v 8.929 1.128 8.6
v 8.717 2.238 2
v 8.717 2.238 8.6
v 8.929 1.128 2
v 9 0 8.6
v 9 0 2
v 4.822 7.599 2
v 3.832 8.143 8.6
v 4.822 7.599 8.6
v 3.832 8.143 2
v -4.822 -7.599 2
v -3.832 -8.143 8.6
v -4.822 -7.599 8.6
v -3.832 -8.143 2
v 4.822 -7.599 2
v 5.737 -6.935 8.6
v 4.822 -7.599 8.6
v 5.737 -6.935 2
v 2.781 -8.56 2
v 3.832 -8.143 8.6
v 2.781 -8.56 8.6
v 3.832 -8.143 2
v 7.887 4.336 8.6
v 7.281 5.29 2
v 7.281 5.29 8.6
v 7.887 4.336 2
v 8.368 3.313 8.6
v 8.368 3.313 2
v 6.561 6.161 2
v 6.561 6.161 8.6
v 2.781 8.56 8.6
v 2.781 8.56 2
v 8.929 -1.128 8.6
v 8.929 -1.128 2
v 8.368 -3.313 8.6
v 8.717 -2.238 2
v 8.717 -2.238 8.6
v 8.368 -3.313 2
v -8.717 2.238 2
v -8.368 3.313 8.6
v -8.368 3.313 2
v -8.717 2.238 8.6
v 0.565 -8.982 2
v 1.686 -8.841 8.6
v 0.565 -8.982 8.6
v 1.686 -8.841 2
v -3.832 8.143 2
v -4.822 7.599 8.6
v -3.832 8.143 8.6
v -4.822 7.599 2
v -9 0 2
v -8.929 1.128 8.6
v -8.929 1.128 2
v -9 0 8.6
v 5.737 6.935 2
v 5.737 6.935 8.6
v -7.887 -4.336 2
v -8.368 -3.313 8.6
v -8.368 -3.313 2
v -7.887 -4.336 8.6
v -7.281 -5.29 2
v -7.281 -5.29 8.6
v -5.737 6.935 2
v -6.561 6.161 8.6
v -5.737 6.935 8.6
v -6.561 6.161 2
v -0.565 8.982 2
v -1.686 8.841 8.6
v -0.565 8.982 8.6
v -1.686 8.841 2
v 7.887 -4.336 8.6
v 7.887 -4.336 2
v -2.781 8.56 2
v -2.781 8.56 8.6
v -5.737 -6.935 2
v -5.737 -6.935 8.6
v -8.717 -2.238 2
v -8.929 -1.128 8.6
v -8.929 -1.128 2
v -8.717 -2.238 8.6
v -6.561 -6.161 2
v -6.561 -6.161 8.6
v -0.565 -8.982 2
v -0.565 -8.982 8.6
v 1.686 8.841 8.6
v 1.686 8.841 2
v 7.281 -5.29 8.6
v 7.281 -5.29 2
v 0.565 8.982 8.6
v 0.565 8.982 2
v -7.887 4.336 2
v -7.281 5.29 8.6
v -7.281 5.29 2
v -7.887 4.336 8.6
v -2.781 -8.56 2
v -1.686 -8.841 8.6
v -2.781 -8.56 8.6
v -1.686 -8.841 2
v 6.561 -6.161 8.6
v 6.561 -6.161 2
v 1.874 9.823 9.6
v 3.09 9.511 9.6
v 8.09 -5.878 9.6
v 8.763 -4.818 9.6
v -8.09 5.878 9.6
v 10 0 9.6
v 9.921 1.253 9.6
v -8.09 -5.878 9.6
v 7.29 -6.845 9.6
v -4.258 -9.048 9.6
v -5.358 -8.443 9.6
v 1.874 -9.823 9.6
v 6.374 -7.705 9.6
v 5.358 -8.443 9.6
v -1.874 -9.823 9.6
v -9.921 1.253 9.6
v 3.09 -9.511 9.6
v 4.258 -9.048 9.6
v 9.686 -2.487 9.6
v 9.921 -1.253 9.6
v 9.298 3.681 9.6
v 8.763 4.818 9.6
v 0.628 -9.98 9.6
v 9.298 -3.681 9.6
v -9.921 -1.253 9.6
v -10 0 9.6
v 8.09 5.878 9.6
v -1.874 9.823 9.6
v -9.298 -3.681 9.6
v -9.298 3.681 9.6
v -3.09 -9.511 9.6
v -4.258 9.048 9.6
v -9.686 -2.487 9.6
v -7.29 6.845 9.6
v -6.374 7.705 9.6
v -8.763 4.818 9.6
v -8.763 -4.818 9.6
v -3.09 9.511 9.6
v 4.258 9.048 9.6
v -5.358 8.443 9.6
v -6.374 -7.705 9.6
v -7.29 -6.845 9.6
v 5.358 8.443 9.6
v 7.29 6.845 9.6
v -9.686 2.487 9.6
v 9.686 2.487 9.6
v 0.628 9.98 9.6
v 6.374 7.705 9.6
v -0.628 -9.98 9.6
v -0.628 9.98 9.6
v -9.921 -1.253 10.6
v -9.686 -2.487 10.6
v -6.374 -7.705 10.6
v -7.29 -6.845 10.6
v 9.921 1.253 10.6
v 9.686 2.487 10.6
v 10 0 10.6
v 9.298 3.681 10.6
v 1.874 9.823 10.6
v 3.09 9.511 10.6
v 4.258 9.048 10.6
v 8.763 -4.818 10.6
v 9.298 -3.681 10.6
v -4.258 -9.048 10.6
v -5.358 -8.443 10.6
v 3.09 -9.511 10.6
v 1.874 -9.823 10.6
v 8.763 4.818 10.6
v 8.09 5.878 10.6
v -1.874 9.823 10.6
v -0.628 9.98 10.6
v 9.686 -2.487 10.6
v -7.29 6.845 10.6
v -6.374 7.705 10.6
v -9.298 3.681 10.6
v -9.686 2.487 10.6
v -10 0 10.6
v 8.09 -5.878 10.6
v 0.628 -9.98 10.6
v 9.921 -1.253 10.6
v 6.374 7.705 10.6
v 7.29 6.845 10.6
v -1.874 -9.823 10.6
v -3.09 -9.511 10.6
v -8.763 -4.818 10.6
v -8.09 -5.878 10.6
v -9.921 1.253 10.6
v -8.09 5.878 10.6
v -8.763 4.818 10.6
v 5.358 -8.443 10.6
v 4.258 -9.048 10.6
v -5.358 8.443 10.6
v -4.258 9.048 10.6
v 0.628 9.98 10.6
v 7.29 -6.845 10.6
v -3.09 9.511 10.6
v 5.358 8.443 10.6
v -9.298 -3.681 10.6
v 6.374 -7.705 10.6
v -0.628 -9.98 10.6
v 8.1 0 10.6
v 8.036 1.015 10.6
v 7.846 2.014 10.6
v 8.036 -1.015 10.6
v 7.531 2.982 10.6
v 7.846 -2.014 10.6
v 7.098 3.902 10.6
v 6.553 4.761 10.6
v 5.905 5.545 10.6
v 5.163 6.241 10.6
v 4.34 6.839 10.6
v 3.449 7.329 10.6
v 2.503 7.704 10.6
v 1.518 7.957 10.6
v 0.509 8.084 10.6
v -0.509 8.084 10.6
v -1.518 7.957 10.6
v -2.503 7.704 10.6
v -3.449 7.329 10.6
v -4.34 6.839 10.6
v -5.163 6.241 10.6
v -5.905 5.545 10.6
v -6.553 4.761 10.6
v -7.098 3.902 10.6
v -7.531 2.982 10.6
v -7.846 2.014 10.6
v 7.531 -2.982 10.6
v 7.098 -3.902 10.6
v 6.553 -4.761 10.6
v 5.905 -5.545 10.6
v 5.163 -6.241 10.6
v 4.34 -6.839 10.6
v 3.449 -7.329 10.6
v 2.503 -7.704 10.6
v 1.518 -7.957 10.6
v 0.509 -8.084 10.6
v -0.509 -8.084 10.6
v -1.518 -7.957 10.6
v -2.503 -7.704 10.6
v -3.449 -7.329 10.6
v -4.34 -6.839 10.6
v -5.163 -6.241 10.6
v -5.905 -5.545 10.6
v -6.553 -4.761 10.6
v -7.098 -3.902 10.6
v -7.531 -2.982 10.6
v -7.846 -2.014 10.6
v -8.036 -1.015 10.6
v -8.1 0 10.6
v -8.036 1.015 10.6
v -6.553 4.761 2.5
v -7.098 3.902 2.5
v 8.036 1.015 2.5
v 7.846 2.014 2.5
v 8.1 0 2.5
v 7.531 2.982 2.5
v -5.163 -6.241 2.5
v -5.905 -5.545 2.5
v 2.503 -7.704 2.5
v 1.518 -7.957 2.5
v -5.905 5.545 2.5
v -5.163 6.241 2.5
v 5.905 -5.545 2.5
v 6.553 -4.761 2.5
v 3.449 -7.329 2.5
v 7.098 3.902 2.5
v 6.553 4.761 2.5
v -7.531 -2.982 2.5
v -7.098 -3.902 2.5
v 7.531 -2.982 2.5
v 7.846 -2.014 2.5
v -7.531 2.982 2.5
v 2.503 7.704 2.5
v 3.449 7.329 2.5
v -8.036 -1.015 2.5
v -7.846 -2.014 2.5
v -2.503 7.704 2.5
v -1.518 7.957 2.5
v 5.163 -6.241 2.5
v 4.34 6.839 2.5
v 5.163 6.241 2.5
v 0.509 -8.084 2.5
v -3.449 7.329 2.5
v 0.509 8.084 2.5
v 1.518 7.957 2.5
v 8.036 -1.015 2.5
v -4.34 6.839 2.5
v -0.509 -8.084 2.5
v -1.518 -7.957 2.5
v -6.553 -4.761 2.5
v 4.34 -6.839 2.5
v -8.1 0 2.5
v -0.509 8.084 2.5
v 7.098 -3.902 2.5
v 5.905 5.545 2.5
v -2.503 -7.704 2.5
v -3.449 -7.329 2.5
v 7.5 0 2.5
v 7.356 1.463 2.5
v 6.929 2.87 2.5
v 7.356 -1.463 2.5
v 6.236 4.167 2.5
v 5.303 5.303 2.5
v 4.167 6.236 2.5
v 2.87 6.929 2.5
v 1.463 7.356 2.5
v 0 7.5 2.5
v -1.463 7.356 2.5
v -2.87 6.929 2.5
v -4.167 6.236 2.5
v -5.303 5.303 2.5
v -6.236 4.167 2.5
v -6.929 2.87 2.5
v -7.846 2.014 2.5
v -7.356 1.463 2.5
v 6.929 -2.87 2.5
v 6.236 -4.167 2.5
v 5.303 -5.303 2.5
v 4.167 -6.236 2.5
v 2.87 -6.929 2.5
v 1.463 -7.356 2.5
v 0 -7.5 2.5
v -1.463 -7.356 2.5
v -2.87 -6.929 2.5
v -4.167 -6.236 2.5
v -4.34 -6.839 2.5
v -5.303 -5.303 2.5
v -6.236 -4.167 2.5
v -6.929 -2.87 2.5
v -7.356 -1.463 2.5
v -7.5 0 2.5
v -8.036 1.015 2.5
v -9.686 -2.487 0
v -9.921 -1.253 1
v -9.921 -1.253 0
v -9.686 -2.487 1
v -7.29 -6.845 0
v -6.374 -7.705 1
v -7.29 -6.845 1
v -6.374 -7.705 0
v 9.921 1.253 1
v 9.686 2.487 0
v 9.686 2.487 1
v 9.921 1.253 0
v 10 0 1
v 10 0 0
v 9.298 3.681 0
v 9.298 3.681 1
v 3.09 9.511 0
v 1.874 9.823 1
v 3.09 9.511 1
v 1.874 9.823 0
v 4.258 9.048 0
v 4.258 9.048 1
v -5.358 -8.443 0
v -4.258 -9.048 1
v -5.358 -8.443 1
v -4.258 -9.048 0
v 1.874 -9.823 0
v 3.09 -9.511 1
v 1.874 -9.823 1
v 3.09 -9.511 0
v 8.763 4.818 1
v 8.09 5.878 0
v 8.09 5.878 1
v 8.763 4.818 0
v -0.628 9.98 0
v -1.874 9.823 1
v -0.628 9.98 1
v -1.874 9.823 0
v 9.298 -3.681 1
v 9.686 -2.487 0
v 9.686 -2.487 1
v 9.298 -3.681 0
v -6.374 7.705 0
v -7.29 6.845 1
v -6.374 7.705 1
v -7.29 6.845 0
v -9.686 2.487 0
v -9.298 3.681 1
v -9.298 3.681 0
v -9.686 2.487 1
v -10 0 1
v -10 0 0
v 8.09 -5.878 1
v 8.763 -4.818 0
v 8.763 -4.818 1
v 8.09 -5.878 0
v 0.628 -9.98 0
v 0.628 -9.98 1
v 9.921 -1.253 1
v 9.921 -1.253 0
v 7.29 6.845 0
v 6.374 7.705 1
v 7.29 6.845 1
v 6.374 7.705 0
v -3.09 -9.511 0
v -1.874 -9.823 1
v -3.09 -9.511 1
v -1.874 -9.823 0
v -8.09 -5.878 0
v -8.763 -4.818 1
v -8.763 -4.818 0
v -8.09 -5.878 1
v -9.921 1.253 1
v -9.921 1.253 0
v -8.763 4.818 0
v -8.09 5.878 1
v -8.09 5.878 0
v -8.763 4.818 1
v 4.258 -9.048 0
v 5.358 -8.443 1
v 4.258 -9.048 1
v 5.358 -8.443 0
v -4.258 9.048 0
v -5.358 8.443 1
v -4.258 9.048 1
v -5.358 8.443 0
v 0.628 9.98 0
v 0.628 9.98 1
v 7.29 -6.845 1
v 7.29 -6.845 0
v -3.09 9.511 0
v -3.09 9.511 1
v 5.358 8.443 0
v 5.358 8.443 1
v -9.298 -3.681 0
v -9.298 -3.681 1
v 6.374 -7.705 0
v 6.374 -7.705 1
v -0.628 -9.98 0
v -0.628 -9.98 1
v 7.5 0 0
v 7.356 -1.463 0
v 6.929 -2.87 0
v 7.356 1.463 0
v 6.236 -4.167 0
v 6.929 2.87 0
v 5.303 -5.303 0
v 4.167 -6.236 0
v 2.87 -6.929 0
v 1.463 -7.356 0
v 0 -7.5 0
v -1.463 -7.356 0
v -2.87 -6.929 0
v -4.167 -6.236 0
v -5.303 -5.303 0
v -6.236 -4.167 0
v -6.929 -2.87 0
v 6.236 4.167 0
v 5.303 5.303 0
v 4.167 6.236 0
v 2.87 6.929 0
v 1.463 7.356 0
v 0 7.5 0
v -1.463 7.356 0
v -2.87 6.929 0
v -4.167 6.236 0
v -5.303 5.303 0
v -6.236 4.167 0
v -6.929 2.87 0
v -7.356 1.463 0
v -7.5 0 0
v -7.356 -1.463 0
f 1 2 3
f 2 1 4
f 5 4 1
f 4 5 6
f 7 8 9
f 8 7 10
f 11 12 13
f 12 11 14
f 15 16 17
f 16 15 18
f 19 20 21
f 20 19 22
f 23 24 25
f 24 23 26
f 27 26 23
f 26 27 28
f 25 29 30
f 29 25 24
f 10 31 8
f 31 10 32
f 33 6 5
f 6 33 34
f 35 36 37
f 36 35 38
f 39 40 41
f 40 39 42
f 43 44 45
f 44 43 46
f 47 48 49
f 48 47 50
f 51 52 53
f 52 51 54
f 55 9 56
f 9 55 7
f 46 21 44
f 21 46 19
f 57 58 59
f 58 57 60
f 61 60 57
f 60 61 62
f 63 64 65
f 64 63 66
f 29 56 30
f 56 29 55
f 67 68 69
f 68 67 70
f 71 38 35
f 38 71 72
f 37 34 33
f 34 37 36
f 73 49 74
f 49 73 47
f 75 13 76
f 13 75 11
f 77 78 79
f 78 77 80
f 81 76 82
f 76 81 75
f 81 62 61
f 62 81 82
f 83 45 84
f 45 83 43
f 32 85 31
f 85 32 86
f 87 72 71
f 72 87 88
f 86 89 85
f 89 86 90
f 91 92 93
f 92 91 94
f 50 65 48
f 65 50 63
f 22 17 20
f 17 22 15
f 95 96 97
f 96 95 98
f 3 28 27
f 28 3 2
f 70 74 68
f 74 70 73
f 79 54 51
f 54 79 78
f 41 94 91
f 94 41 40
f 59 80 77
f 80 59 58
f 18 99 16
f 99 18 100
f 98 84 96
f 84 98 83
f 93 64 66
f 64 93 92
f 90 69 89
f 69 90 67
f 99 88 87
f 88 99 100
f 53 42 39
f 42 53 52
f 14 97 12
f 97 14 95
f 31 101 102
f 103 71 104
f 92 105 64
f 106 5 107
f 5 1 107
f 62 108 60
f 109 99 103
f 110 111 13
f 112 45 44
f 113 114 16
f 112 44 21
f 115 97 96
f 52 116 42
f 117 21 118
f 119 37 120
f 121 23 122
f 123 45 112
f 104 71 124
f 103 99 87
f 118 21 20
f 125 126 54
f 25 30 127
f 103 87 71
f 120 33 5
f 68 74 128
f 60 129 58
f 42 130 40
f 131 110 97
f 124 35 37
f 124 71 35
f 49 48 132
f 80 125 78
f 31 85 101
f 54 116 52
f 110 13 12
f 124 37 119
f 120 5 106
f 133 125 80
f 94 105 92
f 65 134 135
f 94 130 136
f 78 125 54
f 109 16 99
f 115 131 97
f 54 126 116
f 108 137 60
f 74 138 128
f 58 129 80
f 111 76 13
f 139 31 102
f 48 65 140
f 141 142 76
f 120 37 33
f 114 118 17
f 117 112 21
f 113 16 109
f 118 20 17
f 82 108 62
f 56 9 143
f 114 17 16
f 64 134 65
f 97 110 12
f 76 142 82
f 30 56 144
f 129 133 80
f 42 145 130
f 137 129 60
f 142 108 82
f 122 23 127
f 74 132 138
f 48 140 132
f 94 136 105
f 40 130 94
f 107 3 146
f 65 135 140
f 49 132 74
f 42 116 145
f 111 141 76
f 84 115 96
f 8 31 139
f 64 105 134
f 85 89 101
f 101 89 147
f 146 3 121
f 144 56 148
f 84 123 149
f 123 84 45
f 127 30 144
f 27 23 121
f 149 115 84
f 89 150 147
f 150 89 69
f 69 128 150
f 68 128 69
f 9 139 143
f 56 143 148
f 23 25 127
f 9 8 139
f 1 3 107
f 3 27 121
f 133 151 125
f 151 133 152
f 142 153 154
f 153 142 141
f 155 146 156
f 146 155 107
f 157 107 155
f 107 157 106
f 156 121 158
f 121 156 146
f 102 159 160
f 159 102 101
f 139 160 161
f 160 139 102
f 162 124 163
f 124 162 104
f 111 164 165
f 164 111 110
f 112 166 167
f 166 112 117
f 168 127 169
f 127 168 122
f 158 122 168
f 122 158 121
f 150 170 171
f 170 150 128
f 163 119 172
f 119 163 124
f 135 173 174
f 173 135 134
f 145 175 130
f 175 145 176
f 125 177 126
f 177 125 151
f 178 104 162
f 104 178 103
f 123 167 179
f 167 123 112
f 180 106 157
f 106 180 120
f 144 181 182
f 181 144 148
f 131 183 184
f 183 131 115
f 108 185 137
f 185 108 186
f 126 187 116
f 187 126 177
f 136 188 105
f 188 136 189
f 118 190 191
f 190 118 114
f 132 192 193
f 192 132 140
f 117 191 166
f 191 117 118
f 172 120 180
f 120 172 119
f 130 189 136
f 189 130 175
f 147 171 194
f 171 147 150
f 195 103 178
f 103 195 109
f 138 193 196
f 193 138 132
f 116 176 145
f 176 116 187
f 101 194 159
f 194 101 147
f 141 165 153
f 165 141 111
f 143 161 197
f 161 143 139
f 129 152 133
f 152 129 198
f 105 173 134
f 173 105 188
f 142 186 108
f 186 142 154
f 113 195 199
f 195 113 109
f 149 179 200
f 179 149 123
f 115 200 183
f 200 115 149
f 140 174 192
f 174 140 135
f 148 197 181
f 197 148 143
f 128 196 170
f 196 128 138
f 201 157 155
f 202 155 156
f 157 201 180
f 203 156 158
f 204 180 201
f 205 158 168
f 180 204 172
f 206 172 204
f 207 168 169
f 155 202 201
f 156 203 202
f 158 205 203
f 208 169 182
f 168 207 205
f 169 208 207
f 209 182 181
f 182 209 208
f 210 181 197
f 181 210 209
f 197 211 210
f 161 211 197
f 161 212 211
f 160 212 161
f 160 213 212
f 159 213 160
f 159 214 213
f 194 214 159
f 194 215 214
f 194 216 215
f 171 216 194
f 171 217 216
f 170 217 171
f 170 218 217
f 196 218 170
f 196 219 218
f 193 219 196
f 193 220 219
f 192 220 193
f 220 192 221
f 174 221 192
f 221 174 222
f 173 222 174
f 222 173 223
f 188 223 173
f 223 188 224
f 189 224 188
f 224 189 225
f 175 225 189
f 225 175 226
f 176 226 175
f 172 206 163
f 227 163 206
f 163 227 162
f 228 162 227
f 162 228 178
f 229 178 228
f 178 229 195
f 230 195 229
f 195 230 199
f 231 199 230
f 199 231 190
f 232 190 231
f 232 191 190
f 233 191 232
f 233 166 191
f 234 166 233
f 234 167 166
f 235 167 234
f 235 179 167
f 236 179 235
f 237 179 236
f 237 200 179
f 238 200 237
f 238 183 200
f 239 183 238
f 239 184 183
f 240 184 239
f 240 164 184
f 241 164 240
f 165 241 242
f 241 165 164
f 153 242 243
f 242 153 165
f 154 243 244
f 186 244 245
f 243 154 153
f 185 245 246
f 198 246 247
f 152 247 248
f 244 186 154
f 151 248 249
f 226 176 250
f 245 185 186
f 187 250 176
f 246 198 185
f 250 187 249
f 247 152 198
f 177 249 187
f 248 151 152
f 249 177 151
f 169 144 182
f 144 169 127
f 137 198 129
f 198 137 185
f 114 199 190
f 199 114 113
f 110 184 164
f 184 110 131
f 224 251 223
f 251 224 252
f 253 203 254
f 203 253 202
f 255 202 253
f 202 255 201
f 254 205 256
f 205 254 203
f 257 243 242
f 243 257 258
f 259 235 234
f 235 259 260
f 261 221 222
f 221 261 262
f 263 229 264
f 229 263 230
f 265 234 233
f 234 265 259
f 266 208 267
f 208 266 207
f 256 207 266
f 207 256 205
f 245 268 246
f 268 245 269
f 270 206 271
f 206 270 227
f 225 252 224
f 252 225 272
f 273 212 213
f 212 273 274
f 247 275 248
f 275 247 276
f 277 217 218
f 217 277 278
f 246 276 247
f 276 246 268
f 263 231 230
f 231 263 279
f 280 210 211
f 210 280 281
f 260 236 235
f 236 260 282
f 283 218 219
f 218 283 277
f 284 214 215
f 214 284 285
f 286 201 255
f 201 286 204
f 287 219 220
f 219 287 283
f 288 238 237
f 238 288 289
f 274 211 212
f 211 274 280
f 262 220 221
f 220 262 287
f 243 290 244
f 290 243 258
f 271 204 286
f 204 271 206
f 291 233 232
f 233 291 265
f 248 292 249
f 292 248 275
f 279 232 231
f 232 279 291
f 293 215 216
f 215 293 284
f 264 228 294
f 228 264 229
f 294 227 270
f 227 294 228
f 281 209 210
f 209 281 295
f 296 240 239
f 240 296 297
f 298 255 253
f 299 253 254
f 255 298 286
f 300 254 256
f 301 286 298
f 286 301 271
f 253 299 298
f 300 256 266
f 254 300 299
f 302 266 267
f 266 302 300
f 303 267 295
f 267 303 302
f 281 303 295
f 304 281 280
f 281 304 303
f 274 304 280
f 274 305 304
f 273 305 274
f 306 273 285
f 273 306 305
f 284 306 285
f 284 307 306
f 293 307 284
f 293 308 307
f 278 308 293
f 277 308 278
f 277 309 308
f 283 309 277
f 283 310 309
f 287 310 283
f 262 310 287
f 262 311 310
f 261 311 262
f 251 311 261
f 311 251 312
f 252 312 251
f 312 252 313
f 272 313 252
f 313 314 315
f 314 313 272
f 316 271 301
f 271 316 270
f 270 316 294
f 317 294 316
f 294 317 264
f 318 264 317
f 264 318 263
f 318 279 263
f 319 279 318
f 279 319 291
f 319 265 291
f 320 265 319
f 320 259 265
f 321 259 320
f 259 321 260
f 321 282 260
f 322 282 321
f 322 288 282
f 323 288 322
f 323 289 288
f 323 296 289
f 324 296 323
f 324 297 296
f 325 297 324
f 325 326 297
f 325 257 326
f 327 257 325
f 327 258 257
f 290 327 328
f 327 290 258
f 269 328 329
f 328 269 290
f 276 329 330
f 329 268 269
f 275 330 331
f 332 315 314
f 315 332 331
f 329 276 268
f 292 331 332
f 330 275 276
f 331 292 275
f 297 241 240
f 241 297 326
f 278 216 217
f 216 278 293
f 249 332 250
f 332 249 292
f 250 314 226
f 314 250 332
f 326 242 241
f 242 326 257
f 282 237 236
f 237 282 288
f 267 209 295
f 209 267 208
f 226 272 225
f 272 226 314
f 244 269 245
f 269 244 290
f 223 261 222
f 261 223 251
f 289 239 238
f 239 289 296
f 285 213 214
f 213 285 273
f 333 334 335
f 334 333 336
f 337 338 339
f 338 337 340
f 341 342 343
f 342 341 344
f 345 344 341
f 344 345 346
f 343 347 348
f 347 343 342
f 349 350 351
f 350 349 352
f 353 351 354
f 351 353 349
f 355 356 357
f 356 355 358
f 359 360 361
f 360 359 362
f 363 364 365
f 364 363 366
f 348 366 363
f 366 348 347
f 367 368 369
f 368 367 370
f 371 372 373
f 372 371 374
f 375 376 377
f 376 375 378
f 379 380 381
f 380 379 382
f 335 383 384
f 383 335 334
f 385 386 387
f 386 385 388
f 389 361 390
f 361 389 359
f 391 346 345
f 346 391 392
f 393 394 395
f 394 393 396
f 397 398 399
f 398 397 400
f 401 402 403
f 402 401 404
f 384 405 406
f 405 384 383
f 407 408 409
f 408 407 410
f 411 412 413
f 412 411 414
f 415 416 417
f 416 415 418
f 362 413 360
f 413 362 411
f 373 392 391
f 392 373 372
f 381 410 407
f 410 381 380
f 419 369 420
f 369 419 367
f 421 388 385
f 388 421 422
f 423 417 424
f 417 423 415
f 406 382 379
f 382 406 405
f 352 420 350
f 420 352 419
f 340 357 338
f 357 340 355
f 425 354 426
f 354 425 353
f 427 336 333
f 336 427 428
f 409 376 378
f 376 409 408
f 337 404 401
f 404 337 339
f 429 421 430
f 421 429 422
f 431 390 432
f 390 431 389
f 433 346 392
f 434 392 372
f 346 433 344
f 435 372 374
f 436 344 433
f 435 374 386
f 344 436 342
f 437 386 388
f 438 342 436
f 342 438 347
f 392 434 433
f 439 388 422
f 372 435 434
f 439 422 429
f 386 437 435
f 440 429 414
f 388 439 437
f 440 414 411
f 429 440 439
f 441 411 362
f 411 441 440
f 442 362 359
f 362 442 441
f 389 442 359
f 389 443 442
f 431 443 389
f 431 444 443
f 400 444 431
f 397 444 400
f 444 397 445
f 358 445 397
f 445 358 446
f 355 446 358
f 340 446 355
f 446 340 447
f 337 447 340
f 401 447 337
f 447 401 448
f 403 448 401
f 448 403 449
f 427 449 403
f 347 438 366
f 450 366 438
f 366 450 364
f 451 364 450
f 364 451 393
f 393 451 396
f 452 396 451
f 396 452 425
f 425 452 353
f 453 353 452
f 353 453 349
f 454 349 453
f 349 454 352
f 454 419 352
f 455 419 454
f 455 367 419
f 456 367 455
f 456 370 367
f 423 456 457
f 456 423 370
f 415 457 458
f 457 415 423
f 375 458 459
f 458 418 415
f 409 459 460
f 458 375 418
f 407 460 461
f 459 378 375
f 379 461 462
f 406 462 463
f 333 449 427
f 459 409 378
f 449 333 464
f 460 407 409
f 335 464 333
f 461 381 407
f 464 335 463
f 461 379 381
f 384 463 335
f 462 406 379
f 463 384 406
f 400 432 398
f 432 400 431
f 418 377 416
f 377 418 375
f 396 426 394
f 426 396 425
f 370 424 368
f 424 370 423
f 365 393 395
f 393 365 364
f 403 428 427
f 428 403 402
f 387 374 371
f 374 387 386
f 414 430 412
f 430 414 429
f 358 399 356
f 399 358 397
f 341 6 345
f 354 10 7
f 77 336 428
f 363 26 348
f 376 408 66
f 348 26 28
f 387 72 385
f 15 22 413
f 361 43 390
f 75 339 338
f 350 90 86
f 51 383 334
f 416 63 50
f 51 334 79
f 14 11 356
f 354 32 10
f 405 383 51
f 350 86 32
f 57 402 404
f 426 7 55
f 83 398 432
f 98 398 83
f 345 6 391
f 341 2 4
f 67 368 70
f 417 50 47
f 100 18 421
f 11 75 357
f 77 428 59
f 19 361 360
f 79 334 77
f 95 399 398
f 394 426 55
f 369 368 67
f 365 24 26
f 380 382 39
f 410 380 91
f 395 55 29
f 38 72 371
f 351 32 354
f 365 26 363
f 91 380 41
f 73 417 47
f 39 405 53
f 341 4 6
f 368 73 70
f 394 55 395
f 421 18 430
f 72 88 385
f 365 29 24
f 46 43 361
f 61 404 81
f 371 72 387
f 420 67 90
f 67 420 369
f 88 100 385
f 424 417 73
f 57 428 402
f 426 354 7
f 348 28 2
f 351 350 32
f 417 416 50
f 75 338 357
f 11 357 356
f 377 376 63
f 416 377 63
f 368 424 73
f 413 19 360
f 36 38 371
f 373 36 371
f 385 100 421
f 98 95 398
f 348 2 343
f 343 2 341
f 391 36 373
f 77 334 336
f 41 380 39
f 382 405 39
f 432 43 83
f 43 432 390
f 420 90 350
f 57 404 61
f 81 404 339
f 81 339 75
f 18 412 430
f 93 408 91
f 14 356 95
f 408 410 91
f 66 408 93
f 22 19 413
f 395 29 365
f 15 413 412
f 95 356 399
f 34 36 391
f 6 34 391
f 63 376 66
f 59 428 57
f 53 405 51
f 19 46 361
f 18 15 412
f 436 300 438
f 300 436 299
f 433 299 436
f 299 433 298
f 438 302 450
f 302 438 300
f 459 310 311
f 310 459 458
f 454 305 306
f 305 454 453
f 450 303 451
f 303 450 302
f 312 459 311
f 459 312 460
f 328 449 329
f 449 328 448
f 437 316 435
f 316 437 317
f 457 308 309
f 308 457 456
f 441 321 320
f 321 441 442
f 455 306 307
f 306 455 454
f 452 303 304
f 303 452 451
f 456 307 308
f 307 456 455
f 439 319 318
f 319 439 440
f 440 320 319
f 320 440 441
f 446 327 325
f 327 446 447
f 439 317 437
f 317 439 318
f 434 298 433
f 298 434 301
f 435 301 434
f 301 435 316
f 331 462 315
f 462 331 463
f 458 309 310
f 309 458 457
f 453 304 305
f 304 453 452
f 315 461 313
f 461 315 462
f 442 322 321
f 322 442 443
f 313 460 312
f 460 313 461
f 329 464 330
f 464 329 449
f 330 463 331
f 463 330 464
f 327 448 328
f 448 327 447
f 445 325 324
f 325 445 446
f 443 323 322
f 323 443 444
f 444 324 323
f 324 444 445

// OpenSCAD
difference() {
  union() {
    cylinder(d=20,h=1,$fn=50);
    translate([0,0,1]) cylinder(d1=20,d2=18,h=1,$fn=50);
    translate([0,0,2]) difference() {
      union() {
        cylinder(d=18,h=6.6,$fn=50);
        translate([0,0,6.6]) cylinder(d1=18,d2=20,h=1,$fn=50);
        translate([0,0,7.6]) cylinder(d=20,h=1,$fn=50);
      }
      translate([0,0,0.5]) cylinder(d=16.2,h=10,$fn=50);
      *translate([0,0,-.01]) cylinder(d=15,h=10,$fn=50);
    }
  }
  translate([0,0,-.01]) cylinder(d=15,h=100,$fn=32);
}
